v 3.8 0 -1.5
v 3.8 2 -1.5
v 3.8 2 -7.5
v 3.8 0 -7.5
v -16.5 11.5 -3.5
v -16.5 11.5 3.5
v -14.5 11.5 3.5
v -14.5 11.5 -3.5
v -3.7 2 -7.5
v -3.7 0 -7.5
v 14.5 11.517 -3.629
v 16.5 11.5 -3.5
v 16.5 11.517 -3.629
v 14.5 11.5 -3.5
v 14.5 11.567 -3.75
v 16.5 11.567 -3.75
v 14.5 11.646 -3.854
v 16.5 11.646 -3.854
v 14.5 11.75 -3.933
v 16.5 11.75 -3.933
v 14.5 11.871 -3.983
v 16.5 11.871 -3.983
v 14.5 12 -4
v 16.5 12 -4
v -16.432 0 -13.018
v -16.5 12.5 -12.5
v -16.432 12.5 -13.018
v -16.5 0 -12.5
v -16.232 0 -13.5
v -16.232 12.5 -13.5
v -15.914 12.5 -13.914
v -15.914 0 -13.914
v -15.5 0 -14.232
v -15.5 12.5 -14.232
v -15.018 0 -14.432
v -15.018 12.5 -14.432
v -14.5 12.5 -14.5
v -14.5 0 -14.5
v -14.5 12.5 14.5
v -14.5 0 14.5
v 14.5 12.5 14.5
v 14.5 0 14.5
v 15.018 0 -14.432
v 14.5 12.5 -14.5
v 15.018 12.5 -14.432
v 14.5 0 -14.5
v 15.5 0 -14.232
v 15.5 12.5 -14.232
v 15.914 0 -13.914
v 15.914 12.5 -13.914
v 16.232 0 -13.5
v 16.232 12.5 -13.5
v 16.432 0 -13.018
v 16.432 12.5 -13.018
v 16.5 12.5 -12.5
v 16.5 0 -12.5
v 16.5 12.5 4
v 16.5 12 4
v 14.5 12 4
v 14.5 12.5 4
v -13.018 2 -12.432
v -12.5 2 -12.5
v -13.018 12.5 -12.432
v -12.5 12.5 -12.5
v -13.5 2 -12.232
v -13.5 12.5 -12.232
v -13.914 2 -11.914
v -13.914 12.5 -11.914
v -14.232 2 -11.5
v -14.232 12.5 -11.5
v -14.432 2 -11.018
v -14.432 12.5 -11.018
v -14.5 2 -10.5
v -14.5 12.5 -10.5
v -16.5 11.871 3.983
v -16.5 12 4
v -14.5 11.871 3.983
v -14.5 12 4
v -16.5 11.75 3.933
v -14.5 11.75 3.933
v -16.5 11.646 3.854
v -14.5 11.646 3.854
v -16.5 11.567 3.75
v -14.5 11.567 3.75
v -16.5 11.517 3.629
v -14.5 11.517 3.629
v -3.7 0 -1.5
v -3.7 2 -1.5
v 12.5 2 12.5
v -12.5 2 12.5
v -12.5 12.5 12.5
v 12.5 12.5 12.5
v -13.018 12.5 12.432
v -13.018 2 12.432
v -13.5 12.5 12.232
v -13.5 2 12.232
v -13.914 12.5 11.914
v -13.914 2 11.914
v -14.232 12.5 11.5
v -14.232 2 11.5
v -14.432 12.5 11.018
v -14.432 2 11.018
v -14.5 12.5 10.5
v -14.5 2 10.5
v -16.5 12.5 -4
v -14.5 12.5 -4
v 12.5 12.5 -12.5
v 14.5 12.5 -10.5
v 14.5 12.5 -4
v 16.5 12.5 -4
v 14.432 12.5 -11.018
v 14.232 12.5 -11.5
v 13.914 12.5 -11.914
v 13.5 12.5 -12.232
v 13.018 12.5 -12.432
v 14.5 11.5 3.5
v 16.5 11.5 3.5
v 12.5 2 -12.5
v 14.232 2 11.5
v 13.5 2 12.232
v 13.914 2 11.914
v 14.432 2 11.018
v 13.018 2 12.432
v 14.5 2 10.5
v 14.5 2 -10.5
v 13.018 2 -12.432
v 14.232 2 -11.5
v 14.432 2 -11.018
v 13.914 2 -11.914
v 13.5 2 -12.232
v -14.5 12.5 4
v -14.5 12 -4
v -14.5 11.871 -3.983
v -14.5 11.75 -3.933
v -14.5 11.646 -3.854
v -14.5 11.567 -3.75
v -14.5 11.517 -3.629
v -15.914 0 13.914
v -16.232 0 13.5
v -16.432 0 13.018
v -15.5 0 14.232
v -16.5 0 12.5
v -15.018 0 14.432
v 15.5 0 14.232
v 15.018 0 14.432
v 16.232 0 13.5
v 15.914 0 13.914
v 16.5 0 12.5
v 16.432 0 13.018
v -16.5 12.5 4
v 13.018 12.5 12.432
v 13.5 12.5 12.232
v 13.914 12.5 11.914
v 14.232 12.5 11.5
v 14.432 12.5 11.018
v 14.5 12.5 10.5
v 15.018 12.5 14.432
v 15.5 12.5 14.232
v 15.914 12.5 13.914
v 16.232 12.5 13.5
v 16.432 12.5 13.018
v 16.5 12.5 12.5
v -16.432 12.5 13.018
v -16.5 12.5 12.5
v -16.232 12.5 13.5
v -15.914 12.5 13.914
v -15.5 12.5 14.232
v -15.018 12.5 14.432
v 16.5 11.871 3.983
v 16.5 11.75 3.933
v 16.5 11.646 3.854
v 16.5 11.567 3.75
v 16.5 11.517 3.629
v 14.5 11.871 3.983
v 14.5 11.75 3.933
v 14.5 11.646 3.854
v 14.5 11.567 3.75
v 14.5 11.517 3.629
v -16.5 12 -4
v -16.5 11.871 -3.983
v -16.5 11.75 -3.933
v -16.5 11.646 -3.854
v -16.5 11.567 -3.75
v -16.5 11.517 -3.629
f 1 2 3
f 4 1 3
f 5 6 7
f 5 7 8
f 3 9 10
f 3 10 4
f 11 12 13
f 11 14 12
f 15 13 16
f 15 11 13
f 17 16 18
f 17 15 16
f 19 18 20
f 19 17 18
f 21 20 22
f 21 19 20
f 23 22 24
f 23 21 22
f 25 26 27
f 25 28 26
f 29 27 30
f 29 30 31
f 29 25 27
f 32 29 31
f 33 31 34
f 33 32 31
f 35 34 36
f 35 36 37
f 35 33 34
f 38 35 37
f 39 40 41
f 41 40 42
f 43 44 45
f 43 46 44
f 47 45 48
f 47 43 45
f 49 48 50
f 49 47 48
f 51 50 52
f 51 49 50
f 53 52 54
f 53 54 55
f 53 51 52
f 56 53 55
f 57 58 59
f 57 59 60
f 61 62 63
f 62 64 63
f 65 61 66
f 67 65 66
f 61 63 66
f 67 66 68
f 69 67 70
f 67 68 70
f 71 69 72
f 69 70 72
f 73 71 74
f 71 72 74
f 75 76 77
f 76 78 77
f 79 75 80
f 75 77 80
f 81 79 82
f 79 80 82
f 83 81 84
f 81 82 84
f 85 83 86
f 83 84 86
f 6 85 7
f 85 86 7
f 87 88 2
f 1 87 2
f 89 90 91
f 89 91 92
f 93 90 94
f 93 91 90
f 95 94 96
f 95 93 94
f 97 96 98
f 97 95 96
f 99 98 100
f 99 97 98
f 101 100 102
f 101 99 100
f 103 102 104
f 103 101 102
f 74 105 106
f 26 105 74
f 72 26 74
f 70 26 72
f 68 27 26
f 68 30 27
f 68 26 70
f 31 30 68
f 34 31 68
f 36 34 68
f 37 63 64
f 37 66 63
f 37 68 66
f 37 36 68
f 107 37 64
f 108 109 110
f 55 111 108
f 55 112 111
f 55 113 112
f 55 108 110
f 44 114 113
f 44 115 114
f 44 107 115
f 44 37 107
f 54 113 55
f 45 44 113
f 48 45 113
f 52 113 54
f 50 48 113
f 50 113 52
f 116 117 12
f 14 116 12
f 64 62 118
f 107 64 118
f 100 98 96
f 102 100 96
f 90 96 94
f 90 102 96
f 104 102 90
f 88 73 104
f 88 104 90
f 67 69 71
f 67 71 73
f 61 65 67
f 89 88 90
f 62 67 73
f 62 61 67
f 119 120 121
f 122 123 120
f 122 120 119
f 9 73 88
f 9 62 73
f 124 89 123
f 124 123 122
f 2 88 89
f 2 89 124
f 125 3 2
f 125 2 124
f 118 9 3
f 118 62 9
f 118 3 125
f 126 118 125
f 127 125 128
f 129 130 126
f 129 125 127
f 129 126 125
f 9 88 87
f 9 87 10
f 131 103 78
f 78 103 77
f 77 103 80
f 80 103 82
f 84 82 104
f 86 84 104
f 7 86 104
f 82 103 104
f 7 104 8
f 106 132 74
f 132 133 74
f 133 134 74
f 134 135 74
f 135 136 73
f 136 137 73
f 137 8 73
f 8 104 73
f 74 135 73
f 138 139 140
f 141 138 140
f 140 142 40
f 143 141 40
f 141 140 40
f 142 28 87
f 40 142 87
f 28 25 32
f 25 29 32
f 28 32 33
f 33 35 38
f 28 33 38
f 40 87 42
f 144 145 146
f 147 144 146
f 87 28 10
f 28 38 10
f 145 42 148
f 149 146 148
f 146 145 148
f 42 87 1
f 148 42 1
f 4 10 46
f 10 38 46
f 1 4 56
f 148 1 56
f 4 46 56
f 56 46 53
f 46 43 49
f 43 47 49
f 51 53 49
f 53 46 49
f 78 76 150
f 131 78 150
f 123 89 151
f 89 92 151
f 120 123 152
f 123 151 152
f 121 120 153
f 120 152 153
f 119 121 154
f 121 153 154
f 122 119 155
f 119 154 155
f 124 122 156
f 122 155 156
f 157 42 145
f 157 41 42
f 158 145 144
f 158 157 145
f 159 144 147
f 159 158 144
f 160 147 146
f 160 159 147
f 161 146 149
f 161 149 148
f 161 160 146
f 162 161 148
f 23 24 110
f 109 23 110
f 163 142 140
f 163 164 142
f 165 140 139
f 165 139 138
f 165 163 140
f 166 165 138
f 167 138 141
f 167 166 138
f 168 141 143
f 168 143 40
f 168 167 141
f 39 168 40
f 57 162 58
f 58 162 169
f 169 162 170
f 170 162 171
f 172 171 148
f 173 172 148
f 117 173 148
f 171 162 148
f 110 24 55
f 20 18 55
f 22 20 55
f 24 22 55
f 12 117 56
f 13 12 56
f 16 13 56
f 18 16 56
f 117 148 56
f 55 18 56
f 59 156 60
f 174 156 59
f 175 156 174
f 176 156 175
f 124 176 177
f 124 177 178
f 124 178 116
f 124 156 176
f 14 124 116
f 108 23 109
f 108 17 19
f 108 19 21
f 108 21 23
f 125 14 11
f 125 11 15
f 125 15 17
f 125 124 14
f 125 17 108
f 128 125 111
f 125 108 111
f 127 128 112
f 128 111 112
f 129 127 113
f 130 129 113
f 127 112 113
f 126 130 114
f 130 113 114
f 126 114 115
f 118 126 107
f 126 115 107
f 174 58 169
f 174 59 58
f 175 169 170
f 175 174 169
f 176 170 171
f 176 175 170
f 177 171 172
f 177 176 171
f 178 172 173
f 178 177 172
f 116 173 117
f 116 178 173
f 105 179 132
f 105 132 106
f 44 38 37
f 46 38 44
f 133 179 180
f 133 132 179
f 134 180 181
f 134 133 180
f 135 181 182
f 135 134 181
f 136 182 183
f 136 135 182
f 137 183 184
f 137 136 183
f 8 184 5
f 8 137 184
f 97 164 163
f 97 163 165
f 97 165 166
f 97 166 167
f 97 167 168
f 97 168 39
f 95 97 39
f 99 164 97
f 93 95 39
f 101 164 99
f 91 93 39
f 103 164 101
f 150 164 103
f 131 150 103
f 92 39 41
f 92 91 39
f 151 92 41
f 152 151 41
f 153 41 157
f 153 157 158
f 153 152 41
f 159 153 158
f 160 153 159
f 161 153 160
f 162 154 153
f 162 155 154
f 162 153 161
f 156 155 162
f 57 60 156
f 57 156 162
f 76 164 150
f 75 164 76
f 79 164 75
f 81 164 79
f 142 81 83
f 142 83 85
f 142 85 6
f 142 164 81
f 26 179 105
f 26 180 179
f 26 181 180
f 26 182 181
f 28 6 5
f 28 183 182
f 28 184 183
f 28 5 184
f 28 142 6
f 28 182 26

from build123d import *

# Parameters (mm, degrees)
SKETCH1_W            = 33
SKETCH1_H            = 29
BOSS_EXTRUDE1_DEPTH  = 2
SKETCH2_W            = 33
SKETCH2_H            = 29
SKETCH2_W_2          = 29
SKETCH2_H_2          = 25
BOSS_EXTRUDE2_DEPTH  = 10.5
SKETCH4_W            = 7.5
SKETCH4_H            = 6
CUT_EXTRUDE1_DEPTH   = 2
FILLET1_R            = 2
SKETCH5_W            = 8
SKETCH5_H            = 1
CUT_EXTRUDE2_DEPTH   = 31
FILLET2_R            = 0.5
FILLET2_OF_MIRROR1_R = 0.5


with BuildPart() as part:
    # Sketch1 → Boss-Extrude1 (new body)
    with BuildSketch(Plane(origin=(0, 0, 0), x_dir=(1, 0, 0), z_dir=(0, 1, 0))):
        Rectangle(SKETCH1_W, SKETCH1_H)
    extrude(amount=BOSS_EXTRUDE1_DEPTH)

    # Sketch2 → Boss-Extrude2 (add)
    with BuildSketch(Plane(origin=(0, 2, 0), x_dir=(1, 0, 0), z_dir=(0, 1, 0))):
        Rectangle(SKETCH2_W, SKETCH2_H)
        Rectangle(SKETCH2_W_2, SKETCH2_H_2, mode=Mode.SUBTRACT)
    extrude(amount=BOSS_EXTRUDE2_DEPTH)

    # Sketch4 → Cut-Extrude1 (cut)
    with BuildSketch(Plane(origin=(0, 2, 0), x_dir=(1, 0, 0), z_dir=(0, 1, 0))):
        with Locations((0.05, 4.5)):
            Rectangle(SKETCH4_W, SKETCH4_H)
    extrude(amount=-CUT_EXTRUDE1_DEPTH, mode=Mode.SUBTRACT)

    # Fillet1
    fillet1_edges = [part.edges().sort_by_distance(p)[0] for p in [
        (14.5, 7.25, -12.5),
        (-14.5, 7.25, -12.5),
        (-14.5, 7.25, 12.5),
        (14.5, 7.25, 12.5),
        (16.5, 6.25, 14.5),
        (-16.5, 6.25, 14.5),
        (-16.5, 6.25, -14.5),
        (16.5, 6.25, -14.5),
    ]]
    fillet(fillet1_edges, radius=FILLET1_R)

    # Sketch5 → Cut-Extrude2 (cut)
    with BuildSketch(Plane(origin=(16.5, 0, 0), x_dir=(0, 0, -1), z_dir=(1, 0, 0))):
        with Locations((0, 12)):
            Rectangle(SKETCH5_W, SKETCH5_H)
    cut_extrude2 = extrude(amount=-CUT_EXTRUDE2_DEPTH, mode=Mode.SUBTRACT)

    # Fillet2
    fillet2_edges = [part.edges().sort_by_distance(p)[0] for p in [
        (15.5, 11.5, 4),
        (15.5, 11.5, -4),
    ]]
    fillet(fillet2_edges, radius=FILLET2_R)

    # Mirror1: Cut-Extrude2 across plane
    add(cut_extrude2.mirror(Plane(origin=(0, 0, 0), x_dir=(0, 0, 1), z_dir=(1, 0, 0))), mode=Mode.SUBTRACT)

    # Fillet2 of Mirror1
    fillet2_of_mirror1_edges = [part.edges().sort_by_distance(p)[0] for p in [
        (-15.5, 11.5, 4),
        (-15.5, 11.5, -4),
    ]]
    fillet(fillet2_of_mirror1_edges, radius=FILLET2_OF_MIRROR1_R)


solid = part.part
